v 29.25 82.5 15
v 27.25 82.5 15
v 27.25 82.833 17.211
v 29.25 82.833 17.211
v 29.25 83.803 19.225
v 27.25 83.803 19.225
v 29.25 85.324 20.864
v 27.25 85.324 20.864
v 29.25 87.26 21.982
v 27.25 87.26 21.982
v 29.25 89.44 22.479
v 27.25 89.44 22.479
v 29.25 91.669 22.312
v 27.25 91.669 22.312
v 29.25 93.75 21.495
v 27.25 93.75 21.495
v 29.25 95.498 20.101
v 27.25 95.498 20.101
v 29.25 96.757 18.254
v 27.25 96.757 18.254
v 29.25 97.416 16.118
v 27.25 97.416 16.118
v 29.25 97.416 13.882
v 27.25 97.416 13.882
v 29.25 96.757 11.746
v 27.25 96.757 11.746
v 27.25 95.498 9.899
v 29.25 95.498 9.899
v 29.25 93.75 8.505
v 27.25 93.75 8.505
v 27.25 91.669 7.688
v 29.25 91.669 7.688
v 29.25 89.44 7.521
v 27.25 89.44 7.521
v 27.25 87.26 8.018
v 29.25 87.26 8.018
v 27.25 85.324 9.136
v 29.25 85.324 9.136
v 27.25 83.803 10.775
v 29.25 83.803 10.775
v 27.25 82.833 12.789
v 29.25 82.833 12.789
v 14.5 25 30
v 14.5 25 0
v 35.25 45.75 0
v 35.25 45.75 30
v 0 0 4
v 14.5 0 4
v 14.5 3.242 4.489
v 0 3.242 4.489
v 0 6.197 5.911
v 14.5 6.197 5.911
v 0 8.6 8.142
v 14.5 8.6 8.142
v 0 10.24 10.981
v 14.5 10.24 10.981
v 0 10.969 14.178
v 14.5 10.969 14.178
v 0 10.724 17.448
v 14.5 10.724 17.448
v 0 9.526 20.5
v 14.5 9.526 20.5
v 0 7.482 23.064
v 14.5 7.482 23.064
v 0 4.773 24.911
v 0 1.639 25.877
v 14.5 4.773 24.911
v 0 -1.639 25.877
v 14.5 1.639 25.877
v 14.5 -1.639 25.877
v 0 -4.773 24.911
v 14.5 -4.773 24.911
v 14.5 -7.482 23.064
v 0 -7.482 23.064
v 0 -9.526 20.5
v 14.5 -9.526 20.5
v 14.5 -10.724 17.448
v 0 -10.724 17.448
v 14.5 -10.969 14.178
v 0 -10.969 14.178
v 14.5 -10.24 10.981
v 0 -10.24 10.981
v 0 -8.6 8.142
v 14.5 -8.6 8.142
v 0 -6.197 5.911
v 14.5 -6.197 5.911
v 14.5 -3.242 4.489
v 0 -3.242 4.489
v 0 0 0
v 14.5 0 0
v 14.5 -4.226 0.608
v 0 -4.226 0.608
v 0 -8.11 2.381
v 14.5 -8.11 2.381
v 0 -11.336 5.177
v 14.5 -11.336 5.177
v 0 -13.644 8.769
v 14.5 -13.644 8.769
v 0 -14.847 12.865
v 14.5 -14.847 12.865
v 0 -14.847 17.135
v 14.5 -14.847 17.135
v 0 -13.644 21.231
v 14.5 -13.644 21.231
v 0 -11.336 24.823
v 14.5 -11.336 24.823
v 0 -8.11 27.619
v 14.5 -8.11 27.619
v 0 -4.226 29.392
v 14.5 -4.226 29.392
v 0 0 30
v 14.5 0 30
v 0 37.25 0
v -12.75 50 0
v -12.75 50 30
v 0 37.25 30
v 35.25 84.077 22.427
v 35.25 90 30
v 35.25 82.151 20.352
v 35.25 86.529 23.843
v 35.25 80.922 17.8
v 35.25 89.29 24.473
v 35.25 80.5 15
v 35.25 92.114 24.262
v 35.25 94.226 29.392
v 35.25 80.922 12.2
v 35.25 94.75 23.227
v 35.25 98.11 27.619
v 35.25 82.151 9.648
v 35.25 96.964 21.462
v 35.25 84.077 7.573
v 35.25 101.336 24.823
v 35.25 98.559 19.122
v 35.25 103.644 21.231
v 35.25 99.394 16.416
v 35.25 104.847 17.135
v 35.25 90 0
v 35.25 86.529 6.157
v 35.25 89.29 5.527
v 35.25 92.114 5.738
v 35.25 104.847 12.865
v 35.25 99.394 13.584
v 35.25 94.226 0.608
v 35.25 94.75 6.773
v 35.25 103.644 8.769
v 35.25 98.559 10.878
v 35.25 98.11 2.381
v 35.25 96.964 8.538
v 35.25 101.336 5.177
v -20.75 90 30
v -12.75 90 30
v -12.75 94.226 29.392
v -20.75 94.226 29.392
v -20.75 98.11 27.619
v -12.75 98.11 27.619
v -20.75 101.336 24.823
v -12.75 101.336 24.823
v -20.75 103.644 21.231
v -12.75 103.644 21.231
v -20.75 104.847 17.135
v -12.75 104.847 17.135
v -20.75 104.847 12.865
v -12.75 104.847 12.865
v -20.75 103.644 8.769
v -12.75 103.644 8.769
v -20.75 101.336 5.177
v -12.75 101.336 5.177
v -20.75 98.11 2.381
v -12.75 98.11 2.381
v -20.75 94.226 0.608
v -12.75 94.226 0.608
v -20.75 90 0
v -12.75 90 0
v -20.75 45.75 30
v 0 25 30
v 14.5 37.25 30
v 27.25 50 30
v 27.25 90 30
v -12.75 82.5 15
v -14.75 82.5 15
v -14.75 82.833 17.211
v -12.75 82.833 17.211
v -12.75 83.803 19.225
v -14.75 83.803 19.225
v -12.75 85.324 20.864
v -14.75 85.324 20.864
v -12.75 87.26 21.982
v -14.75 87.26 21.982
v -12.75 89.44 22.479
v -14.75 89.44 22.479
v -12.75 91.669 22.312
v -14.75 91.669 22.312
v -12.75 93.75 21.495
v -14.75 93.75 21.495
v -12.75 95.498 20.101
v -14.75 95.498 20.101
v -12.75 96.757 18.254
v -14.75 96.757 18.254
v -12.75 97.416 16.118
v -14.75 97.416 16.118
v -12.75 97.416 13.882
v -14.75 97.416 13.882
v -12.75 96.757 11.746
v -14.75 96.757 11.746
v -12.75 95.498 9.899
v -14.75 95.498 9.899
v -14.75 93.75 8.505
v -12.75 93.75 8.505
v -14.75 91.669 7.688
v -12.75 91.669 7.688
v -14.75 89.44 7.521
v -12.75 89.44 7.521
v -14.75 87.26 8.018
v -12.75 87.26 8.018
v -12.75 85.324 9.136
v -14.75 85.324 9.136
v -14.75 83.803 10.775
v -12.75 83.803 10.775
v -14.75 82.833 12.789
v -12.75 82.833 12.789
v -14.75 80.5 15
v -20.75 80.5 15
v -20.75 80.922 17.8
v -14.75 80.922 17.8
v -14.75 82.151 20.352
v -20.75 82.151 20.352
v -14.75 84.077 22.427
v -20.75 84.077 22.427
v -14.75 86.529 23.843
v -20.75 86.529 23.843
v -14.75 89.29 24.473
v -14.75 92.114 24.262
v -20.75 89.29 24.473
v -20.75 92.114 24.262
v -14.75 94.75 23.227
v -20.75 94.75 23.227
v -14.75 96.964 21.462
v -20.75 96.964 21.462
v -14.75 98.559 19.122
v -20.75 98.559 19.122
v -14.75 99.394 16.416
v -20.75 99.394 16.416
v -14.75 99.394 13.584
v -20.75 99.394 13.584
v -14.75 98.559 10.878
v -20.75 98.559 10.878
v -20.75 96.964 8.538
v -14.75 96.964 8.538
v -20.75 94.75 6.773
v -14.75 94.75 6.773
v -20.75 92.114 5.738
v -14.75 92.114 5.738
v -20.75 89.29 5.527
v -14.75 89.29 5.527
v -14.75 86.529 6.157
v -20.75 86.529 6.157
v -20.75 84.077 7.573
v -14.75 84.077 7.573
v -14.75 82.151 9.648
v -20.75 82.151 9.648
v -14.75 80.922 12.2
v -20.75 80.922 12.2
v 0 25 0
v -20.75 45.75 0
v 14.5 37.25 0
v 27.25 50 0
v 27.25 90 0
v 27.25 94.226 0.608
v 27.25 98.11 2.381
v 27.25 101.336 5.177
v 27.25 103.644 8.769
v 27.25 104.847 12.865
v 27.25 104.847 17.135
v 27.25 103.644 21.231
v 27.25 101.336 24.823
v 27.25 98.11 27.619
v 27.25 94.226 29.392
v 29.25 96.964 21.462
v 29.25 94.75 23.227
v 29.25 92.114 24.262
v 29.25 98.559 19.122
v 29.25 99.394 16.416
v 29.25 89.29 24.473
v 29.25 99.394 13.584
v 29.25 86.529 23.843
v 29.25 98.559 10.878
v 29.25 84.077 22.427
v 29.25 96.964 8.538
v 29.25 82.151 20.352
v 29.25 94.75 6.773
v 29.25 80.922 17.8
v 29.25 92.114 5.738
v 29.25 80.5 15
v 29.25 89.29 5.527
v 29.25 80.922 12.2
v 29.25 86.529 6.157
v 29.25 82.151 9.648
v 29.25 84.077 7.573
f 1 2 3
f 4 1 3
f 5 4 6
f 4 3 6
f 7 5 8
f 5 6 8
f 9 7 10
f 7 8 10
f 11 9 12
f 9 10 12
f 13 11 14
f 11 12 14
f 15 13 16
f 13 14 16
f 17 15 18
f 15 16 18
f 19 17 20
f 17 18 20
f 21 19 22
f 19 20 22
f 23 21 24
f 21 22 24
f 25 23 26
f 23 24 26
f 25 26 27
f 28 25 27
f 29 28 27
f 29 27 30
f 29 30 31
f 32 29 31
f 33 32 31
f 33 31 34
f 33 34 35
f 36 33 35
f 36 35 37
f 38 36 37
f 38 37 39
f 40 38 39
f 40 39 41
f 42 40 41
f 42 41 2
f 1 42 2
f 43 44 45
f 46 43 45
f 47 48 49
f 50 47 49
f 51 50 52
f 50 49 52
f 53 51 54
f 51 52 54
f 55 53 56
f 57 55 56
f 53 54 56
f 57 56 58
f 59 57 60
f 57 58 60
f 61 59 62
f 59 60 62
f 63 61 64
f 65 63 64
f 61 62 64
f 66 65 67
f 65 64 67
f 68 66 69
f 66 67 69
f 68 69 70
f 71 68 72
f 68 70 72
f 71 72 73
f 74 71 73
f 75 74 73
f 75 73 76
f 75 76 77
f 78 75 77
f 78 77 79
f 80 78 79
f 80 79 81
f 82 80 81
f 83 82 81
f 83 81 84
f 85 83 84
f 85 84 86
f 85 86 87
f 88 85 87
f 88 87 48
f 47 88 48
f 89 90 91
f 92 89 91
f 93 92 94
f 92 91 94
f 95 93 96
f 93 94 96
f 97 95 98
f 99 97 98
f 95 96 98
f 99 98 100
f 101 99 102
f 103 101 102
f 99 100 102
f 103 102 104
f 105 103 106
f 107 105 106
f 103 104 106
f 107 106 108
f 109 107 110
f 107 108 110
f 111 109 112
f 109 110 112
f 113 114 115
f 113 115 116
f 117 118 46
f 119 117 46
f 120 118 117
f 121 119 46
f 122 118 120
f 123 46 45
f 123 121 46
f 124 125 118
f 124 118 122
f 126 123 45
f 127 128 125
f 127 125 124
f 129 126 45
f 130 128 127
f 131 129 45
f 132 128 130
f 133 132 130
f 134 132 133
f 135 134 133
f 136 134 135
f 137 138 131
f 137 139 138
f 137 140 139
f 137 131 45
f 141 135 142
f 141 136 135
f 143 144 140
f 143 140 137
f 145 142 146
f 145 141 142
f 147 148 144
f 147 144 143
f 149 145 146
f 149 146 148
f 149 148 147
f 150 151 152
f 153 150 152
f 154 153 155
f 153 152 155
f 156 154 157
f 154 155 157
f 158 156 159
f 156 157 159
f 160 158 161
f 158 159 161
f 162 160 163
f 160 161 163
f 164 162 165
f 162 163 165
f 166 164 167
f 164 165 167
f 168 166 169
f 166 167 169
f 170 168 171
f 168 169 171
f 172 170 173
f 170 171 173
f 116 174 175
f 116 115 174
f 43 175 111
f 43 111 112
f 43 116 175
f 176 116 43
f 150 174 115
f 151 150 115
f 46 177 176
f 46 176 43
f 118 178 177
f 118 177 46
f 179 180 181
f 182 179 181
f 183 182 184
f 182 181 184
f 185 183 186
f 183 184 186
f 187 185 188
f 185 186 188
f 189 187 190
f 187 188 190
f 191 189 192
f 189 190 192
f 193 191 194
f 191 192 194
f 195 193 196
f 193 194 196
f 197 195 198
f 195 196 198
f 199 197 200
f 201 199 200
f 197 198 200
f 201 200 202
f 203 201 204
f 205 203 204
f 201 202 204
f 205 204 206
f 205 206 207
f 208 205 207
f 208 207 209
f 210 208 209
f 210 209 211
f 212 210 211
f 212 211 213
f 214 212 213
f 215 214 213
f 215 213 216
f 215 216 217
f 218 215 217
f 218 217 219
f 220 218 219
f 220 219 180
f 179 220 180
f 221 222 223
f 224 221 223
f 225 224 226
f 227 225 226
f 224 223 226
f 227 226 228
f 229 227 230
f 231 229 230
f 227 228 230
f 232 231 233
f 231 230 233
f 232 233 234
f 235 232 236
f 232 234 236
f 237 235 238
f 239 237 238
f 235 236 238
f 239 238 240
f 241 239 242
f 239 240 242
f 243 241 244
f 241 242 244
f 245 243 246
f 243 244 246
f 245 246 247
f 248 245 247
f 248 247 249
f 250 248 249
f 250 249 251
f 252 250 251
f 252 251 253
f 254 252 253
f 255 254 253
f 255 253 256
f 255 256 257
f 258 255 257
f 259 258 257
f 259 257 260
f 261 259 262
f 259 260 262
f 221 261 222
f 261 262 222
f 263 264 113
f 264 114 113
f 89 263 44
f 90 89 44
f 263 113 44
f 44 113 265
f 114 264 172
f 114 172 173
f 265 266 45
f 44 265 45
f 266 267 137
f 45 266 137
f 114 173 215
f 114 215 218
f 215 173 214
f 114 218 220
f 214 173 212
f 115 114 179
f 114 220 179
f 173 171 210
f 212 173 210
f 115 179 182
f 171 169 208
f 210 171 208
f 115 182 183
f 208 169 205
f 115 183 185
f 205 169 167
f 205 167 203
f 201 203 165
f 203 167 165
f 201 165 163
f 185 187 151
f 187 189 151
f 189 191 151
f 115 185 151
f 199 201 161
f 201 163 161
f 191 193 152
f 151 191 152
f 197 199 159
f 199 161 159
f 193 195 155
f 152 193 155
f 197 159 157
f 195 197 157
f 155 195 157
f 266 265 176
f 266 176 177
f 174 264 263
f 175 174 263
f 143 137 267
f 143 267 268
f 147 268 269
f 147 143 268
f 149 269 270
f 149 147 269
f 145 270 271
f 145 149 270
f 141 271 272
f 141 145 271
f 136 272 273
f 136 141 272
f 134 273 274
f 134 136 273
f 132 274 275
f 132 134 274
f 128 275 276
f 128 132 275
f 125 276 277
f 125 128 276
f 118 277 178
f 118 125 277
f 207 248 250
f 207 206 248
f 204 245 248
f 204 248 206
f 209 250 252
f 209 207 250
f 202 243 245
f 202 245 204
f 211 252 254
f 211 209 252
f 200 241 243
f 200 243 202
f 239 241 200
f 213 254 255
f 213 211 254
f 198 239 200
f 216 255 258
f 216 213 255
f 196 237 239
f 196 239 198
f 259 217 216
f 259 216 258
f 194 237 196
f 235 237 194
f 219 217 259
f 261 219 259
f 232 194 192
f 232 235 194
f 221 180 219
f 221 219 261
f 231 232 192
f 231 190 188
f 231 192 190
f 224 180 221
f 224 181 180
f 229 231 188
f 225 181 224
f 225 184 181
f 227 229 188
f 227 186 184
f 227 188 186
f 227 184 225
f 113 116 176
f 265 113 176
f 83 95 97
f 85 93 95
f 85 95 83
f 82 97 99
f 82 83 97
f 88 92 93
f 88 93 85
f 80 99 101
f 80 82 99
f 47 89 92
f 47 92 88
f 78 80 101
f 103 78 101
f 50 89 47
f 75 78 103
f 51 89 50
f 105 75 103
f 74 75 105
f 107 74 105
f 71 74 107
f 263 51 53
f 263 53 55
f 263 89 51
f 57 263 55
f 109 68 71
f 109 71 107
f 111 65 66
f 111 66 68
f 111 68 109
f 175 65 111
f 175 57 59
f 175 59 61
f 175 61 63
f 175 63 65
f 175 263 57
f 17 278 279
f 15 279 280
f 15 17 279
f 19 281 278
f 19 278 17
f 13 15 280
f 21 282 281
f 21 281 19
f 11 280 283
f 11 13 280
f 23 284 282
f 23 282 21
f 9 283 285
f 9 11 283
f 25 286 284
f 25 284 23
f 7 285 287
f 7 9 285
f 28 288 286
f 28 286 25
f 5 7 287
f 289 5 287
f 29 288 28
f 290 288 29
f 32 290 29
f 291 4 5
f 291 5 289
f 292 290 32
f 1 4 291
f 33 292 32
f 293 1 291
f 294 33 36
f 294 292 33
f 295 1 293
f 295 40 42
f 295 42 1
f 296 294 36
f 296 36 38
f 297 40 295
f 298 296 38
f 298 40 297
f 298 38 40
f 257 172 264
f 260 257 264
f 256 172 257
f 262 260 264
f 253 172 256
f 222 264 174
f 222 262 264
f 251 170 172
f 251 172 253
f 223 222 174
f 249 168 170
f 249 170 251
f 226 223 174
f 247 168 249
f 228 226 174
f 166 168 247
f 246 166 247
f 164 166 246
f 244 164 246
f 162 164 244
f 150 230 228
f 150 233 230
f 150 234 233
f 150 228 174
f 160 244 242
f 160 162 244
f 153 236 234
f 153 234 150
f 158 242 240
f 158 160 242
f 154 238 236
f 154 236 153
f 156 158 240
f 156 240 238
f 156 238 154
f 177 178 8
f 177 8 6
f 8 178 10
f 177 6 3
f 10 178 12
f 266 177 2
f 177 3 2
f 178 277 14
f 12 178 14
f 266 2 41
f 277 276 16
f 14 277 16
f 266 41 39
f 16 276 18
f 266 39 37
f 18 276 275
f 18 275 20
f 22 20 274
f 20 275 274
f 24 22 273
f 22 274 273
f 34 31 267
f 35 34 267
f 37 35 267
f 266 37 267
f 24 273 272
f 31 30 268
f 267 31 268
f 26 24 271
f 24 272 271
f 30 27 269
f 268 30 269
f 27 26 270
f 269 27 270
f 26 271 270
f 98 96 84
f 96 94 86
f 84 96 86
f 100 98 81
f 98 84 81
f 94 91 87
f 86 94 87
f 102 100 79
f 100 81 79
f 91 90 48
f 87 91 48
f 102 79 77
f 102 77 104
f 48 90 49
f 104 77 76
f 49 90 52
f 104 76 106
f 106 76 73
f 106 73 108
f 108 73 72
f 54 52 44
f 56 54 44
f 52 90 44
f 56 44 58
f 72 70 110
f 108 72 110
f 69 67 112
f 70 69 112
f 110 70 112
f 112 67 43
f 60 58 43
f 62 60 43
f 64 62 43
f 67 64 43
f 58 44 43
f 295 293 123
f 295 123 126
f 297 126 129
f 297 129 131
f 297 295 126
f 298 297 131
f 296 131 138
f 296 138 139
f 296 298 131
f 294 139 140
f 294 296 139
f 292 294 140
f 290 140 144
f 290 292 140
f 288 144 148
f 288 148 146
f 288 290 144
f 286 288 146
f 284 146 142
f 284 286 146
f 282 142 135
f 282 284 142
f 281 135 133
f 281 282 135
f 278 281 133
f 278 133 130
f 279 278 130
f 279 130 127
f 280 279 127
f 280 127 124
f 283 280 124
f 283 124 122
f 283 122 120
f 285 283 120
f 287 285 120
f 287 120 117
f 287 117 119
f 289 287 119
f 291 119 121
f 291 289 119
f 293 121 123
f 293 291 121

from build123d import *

# Parameters (mm, degrees)
EXTRUDE_1_DEPTH     = 30
CUT_EXTRUDE_1_DEPTH = 102.205545797
EXTRUDE_2_DEPTH     = 14.5
SKETCH_4_R          = 11
CUT_EXTRUDE_2_DEPTH = 20
EXTRUDE_3_DEPTH     = 8
EXTRUDE_START       = -8
EXTRUDE_4_DEPTH     = 8
SKETCH_9_R          = 7.5
CUT_EXTRUDE_5_DEPTH = 62
SKETCH_10_R         = 9.5
CUT_EXTRUDE_6_DEPTH = 6
CUT_EXTRUDE_START   = -6
SKETCH_11_R         = 9.5
CUT_EXTRUDE_7_DEPTH = 6


with BuildPart() as part:
    # 草图1 → 凸台-拉伸1 (new body)
    with BuildSketch(Plane.XY):
        Polygon((0, 0), (14.5, 0), (14.5, 25), (35.25, 45.75), (35.25, 90), (27.25, 90), (27.25, 50), (-12.75, 50), (-12.75, 90), (-20.75, 90), (-20.75, 45.75), (0, 25), align=None)
    extrude(amount=EXTRUDE_1_DEPTH)

    # 草图2 → 切除-拉伸1 (cut, through all)
    with BuildSketch(Plane.XY.offset(30)):
        Polygon((-12.75, 50), (0, 37.25), (14.5, 37.25), (27.25, 50), align=None)
    extrude(amount=-CUT_EXTRUDE_1_DEPTH, mode=Mode.SUBTRACT)

    # 草图3 → 凸台-拉伸2 (add)
    with BuildSketch(Plane(origin=(14.5, 0, 0), x_dir=(0, 0, -1), z_dir=(1, 0, 0))):
        with BuildLine():
            Line((-30, 0), (0, 0))
            ThreePointArc((0, 0), (-15, -15), (-30, 0))
        make_face()
    extrude(amount=-EXTRUDE_2_DEPTH)

    # 草图4 → 切除-拉伸2 (cut)
    with BuildSketch(Plane(origin=(14.5, 0, 0), x_dir=(0, 0, -1), z_dir=(1, 0, 0))):
        with Locations((-15, 0)):
            Circle(SKETCH_4_R)
    extrude(amount=-CUT_EXTRUDE_2_DEPTH, mode=Mode.SUBTRACT)

    # 草图7 → 凸台-拉伸3 (add)
    with BuildSketch(Plane(origin=(35.25, 0, 0), x_dir=(0, 0, -1), z_dir=(1, 0, 0))):
        with BuildLine():
            Line((-30, 90), (0, 90))
            ThreePointArc((0, 90), (-15, 105), (-30, 90))
        make_face()
    extrude(amount=-EXTRUDE_3_DEPTH)

    # 草图8 → 凸台-拉伸4 (add)
    with BuildSketch(Plane.ZY.offset(20.75).offset(EXTRUDE_START)):
        with BuildLine():
            Line((0, 90), (30, 90))
            ThreePointArc((30, 90), (15, 105), (0, 90))
        make_face()
    extrude(amount=EXTRUDE_4_DEPTH)

    # 草图9 → 切除-拉伸5 (cut)
    with BuildSketch(Plane.ZY.offset(20.75)):
        with Locations(Location((15, 90, 0), (0, 0, 270))):
            Circle(SKETCH_9_R)
    extrude(amount=-CUT_EXTRUDE_5_DEPTH, mode=Mode.SUBTRACT)

    # 草图10 → 切除-拉伸6 (cut)
    with BuildSketch(Plane.ZY.offset(20.75)):
        with Locations(Location((15, 90, 0), (0, 0, 270))):
            Circle(SKETCH_10_R)
    extrude(amount=-CUT_EXTRUDE_6_DEPTH, mode=Mode.SUBTRACT)

    # 草图11 → 切除-拉伸7 (cut)
    with BuildSketch(Plane(origin=(35.25, 0, 0), x_dir=(0, 0, -1), z_dir=(1, 0, 0)).offset(CUT_EXTRUDE_START)):
        with Locations(Location((-15, 90, 0), (0, 0, 270))):
            Circle(SKETCH_11_R)
    extrude(amount=CUT_EXTRUDE_7_DEPTH, mode=Mode.SUBTRACT)


solid = part.part
